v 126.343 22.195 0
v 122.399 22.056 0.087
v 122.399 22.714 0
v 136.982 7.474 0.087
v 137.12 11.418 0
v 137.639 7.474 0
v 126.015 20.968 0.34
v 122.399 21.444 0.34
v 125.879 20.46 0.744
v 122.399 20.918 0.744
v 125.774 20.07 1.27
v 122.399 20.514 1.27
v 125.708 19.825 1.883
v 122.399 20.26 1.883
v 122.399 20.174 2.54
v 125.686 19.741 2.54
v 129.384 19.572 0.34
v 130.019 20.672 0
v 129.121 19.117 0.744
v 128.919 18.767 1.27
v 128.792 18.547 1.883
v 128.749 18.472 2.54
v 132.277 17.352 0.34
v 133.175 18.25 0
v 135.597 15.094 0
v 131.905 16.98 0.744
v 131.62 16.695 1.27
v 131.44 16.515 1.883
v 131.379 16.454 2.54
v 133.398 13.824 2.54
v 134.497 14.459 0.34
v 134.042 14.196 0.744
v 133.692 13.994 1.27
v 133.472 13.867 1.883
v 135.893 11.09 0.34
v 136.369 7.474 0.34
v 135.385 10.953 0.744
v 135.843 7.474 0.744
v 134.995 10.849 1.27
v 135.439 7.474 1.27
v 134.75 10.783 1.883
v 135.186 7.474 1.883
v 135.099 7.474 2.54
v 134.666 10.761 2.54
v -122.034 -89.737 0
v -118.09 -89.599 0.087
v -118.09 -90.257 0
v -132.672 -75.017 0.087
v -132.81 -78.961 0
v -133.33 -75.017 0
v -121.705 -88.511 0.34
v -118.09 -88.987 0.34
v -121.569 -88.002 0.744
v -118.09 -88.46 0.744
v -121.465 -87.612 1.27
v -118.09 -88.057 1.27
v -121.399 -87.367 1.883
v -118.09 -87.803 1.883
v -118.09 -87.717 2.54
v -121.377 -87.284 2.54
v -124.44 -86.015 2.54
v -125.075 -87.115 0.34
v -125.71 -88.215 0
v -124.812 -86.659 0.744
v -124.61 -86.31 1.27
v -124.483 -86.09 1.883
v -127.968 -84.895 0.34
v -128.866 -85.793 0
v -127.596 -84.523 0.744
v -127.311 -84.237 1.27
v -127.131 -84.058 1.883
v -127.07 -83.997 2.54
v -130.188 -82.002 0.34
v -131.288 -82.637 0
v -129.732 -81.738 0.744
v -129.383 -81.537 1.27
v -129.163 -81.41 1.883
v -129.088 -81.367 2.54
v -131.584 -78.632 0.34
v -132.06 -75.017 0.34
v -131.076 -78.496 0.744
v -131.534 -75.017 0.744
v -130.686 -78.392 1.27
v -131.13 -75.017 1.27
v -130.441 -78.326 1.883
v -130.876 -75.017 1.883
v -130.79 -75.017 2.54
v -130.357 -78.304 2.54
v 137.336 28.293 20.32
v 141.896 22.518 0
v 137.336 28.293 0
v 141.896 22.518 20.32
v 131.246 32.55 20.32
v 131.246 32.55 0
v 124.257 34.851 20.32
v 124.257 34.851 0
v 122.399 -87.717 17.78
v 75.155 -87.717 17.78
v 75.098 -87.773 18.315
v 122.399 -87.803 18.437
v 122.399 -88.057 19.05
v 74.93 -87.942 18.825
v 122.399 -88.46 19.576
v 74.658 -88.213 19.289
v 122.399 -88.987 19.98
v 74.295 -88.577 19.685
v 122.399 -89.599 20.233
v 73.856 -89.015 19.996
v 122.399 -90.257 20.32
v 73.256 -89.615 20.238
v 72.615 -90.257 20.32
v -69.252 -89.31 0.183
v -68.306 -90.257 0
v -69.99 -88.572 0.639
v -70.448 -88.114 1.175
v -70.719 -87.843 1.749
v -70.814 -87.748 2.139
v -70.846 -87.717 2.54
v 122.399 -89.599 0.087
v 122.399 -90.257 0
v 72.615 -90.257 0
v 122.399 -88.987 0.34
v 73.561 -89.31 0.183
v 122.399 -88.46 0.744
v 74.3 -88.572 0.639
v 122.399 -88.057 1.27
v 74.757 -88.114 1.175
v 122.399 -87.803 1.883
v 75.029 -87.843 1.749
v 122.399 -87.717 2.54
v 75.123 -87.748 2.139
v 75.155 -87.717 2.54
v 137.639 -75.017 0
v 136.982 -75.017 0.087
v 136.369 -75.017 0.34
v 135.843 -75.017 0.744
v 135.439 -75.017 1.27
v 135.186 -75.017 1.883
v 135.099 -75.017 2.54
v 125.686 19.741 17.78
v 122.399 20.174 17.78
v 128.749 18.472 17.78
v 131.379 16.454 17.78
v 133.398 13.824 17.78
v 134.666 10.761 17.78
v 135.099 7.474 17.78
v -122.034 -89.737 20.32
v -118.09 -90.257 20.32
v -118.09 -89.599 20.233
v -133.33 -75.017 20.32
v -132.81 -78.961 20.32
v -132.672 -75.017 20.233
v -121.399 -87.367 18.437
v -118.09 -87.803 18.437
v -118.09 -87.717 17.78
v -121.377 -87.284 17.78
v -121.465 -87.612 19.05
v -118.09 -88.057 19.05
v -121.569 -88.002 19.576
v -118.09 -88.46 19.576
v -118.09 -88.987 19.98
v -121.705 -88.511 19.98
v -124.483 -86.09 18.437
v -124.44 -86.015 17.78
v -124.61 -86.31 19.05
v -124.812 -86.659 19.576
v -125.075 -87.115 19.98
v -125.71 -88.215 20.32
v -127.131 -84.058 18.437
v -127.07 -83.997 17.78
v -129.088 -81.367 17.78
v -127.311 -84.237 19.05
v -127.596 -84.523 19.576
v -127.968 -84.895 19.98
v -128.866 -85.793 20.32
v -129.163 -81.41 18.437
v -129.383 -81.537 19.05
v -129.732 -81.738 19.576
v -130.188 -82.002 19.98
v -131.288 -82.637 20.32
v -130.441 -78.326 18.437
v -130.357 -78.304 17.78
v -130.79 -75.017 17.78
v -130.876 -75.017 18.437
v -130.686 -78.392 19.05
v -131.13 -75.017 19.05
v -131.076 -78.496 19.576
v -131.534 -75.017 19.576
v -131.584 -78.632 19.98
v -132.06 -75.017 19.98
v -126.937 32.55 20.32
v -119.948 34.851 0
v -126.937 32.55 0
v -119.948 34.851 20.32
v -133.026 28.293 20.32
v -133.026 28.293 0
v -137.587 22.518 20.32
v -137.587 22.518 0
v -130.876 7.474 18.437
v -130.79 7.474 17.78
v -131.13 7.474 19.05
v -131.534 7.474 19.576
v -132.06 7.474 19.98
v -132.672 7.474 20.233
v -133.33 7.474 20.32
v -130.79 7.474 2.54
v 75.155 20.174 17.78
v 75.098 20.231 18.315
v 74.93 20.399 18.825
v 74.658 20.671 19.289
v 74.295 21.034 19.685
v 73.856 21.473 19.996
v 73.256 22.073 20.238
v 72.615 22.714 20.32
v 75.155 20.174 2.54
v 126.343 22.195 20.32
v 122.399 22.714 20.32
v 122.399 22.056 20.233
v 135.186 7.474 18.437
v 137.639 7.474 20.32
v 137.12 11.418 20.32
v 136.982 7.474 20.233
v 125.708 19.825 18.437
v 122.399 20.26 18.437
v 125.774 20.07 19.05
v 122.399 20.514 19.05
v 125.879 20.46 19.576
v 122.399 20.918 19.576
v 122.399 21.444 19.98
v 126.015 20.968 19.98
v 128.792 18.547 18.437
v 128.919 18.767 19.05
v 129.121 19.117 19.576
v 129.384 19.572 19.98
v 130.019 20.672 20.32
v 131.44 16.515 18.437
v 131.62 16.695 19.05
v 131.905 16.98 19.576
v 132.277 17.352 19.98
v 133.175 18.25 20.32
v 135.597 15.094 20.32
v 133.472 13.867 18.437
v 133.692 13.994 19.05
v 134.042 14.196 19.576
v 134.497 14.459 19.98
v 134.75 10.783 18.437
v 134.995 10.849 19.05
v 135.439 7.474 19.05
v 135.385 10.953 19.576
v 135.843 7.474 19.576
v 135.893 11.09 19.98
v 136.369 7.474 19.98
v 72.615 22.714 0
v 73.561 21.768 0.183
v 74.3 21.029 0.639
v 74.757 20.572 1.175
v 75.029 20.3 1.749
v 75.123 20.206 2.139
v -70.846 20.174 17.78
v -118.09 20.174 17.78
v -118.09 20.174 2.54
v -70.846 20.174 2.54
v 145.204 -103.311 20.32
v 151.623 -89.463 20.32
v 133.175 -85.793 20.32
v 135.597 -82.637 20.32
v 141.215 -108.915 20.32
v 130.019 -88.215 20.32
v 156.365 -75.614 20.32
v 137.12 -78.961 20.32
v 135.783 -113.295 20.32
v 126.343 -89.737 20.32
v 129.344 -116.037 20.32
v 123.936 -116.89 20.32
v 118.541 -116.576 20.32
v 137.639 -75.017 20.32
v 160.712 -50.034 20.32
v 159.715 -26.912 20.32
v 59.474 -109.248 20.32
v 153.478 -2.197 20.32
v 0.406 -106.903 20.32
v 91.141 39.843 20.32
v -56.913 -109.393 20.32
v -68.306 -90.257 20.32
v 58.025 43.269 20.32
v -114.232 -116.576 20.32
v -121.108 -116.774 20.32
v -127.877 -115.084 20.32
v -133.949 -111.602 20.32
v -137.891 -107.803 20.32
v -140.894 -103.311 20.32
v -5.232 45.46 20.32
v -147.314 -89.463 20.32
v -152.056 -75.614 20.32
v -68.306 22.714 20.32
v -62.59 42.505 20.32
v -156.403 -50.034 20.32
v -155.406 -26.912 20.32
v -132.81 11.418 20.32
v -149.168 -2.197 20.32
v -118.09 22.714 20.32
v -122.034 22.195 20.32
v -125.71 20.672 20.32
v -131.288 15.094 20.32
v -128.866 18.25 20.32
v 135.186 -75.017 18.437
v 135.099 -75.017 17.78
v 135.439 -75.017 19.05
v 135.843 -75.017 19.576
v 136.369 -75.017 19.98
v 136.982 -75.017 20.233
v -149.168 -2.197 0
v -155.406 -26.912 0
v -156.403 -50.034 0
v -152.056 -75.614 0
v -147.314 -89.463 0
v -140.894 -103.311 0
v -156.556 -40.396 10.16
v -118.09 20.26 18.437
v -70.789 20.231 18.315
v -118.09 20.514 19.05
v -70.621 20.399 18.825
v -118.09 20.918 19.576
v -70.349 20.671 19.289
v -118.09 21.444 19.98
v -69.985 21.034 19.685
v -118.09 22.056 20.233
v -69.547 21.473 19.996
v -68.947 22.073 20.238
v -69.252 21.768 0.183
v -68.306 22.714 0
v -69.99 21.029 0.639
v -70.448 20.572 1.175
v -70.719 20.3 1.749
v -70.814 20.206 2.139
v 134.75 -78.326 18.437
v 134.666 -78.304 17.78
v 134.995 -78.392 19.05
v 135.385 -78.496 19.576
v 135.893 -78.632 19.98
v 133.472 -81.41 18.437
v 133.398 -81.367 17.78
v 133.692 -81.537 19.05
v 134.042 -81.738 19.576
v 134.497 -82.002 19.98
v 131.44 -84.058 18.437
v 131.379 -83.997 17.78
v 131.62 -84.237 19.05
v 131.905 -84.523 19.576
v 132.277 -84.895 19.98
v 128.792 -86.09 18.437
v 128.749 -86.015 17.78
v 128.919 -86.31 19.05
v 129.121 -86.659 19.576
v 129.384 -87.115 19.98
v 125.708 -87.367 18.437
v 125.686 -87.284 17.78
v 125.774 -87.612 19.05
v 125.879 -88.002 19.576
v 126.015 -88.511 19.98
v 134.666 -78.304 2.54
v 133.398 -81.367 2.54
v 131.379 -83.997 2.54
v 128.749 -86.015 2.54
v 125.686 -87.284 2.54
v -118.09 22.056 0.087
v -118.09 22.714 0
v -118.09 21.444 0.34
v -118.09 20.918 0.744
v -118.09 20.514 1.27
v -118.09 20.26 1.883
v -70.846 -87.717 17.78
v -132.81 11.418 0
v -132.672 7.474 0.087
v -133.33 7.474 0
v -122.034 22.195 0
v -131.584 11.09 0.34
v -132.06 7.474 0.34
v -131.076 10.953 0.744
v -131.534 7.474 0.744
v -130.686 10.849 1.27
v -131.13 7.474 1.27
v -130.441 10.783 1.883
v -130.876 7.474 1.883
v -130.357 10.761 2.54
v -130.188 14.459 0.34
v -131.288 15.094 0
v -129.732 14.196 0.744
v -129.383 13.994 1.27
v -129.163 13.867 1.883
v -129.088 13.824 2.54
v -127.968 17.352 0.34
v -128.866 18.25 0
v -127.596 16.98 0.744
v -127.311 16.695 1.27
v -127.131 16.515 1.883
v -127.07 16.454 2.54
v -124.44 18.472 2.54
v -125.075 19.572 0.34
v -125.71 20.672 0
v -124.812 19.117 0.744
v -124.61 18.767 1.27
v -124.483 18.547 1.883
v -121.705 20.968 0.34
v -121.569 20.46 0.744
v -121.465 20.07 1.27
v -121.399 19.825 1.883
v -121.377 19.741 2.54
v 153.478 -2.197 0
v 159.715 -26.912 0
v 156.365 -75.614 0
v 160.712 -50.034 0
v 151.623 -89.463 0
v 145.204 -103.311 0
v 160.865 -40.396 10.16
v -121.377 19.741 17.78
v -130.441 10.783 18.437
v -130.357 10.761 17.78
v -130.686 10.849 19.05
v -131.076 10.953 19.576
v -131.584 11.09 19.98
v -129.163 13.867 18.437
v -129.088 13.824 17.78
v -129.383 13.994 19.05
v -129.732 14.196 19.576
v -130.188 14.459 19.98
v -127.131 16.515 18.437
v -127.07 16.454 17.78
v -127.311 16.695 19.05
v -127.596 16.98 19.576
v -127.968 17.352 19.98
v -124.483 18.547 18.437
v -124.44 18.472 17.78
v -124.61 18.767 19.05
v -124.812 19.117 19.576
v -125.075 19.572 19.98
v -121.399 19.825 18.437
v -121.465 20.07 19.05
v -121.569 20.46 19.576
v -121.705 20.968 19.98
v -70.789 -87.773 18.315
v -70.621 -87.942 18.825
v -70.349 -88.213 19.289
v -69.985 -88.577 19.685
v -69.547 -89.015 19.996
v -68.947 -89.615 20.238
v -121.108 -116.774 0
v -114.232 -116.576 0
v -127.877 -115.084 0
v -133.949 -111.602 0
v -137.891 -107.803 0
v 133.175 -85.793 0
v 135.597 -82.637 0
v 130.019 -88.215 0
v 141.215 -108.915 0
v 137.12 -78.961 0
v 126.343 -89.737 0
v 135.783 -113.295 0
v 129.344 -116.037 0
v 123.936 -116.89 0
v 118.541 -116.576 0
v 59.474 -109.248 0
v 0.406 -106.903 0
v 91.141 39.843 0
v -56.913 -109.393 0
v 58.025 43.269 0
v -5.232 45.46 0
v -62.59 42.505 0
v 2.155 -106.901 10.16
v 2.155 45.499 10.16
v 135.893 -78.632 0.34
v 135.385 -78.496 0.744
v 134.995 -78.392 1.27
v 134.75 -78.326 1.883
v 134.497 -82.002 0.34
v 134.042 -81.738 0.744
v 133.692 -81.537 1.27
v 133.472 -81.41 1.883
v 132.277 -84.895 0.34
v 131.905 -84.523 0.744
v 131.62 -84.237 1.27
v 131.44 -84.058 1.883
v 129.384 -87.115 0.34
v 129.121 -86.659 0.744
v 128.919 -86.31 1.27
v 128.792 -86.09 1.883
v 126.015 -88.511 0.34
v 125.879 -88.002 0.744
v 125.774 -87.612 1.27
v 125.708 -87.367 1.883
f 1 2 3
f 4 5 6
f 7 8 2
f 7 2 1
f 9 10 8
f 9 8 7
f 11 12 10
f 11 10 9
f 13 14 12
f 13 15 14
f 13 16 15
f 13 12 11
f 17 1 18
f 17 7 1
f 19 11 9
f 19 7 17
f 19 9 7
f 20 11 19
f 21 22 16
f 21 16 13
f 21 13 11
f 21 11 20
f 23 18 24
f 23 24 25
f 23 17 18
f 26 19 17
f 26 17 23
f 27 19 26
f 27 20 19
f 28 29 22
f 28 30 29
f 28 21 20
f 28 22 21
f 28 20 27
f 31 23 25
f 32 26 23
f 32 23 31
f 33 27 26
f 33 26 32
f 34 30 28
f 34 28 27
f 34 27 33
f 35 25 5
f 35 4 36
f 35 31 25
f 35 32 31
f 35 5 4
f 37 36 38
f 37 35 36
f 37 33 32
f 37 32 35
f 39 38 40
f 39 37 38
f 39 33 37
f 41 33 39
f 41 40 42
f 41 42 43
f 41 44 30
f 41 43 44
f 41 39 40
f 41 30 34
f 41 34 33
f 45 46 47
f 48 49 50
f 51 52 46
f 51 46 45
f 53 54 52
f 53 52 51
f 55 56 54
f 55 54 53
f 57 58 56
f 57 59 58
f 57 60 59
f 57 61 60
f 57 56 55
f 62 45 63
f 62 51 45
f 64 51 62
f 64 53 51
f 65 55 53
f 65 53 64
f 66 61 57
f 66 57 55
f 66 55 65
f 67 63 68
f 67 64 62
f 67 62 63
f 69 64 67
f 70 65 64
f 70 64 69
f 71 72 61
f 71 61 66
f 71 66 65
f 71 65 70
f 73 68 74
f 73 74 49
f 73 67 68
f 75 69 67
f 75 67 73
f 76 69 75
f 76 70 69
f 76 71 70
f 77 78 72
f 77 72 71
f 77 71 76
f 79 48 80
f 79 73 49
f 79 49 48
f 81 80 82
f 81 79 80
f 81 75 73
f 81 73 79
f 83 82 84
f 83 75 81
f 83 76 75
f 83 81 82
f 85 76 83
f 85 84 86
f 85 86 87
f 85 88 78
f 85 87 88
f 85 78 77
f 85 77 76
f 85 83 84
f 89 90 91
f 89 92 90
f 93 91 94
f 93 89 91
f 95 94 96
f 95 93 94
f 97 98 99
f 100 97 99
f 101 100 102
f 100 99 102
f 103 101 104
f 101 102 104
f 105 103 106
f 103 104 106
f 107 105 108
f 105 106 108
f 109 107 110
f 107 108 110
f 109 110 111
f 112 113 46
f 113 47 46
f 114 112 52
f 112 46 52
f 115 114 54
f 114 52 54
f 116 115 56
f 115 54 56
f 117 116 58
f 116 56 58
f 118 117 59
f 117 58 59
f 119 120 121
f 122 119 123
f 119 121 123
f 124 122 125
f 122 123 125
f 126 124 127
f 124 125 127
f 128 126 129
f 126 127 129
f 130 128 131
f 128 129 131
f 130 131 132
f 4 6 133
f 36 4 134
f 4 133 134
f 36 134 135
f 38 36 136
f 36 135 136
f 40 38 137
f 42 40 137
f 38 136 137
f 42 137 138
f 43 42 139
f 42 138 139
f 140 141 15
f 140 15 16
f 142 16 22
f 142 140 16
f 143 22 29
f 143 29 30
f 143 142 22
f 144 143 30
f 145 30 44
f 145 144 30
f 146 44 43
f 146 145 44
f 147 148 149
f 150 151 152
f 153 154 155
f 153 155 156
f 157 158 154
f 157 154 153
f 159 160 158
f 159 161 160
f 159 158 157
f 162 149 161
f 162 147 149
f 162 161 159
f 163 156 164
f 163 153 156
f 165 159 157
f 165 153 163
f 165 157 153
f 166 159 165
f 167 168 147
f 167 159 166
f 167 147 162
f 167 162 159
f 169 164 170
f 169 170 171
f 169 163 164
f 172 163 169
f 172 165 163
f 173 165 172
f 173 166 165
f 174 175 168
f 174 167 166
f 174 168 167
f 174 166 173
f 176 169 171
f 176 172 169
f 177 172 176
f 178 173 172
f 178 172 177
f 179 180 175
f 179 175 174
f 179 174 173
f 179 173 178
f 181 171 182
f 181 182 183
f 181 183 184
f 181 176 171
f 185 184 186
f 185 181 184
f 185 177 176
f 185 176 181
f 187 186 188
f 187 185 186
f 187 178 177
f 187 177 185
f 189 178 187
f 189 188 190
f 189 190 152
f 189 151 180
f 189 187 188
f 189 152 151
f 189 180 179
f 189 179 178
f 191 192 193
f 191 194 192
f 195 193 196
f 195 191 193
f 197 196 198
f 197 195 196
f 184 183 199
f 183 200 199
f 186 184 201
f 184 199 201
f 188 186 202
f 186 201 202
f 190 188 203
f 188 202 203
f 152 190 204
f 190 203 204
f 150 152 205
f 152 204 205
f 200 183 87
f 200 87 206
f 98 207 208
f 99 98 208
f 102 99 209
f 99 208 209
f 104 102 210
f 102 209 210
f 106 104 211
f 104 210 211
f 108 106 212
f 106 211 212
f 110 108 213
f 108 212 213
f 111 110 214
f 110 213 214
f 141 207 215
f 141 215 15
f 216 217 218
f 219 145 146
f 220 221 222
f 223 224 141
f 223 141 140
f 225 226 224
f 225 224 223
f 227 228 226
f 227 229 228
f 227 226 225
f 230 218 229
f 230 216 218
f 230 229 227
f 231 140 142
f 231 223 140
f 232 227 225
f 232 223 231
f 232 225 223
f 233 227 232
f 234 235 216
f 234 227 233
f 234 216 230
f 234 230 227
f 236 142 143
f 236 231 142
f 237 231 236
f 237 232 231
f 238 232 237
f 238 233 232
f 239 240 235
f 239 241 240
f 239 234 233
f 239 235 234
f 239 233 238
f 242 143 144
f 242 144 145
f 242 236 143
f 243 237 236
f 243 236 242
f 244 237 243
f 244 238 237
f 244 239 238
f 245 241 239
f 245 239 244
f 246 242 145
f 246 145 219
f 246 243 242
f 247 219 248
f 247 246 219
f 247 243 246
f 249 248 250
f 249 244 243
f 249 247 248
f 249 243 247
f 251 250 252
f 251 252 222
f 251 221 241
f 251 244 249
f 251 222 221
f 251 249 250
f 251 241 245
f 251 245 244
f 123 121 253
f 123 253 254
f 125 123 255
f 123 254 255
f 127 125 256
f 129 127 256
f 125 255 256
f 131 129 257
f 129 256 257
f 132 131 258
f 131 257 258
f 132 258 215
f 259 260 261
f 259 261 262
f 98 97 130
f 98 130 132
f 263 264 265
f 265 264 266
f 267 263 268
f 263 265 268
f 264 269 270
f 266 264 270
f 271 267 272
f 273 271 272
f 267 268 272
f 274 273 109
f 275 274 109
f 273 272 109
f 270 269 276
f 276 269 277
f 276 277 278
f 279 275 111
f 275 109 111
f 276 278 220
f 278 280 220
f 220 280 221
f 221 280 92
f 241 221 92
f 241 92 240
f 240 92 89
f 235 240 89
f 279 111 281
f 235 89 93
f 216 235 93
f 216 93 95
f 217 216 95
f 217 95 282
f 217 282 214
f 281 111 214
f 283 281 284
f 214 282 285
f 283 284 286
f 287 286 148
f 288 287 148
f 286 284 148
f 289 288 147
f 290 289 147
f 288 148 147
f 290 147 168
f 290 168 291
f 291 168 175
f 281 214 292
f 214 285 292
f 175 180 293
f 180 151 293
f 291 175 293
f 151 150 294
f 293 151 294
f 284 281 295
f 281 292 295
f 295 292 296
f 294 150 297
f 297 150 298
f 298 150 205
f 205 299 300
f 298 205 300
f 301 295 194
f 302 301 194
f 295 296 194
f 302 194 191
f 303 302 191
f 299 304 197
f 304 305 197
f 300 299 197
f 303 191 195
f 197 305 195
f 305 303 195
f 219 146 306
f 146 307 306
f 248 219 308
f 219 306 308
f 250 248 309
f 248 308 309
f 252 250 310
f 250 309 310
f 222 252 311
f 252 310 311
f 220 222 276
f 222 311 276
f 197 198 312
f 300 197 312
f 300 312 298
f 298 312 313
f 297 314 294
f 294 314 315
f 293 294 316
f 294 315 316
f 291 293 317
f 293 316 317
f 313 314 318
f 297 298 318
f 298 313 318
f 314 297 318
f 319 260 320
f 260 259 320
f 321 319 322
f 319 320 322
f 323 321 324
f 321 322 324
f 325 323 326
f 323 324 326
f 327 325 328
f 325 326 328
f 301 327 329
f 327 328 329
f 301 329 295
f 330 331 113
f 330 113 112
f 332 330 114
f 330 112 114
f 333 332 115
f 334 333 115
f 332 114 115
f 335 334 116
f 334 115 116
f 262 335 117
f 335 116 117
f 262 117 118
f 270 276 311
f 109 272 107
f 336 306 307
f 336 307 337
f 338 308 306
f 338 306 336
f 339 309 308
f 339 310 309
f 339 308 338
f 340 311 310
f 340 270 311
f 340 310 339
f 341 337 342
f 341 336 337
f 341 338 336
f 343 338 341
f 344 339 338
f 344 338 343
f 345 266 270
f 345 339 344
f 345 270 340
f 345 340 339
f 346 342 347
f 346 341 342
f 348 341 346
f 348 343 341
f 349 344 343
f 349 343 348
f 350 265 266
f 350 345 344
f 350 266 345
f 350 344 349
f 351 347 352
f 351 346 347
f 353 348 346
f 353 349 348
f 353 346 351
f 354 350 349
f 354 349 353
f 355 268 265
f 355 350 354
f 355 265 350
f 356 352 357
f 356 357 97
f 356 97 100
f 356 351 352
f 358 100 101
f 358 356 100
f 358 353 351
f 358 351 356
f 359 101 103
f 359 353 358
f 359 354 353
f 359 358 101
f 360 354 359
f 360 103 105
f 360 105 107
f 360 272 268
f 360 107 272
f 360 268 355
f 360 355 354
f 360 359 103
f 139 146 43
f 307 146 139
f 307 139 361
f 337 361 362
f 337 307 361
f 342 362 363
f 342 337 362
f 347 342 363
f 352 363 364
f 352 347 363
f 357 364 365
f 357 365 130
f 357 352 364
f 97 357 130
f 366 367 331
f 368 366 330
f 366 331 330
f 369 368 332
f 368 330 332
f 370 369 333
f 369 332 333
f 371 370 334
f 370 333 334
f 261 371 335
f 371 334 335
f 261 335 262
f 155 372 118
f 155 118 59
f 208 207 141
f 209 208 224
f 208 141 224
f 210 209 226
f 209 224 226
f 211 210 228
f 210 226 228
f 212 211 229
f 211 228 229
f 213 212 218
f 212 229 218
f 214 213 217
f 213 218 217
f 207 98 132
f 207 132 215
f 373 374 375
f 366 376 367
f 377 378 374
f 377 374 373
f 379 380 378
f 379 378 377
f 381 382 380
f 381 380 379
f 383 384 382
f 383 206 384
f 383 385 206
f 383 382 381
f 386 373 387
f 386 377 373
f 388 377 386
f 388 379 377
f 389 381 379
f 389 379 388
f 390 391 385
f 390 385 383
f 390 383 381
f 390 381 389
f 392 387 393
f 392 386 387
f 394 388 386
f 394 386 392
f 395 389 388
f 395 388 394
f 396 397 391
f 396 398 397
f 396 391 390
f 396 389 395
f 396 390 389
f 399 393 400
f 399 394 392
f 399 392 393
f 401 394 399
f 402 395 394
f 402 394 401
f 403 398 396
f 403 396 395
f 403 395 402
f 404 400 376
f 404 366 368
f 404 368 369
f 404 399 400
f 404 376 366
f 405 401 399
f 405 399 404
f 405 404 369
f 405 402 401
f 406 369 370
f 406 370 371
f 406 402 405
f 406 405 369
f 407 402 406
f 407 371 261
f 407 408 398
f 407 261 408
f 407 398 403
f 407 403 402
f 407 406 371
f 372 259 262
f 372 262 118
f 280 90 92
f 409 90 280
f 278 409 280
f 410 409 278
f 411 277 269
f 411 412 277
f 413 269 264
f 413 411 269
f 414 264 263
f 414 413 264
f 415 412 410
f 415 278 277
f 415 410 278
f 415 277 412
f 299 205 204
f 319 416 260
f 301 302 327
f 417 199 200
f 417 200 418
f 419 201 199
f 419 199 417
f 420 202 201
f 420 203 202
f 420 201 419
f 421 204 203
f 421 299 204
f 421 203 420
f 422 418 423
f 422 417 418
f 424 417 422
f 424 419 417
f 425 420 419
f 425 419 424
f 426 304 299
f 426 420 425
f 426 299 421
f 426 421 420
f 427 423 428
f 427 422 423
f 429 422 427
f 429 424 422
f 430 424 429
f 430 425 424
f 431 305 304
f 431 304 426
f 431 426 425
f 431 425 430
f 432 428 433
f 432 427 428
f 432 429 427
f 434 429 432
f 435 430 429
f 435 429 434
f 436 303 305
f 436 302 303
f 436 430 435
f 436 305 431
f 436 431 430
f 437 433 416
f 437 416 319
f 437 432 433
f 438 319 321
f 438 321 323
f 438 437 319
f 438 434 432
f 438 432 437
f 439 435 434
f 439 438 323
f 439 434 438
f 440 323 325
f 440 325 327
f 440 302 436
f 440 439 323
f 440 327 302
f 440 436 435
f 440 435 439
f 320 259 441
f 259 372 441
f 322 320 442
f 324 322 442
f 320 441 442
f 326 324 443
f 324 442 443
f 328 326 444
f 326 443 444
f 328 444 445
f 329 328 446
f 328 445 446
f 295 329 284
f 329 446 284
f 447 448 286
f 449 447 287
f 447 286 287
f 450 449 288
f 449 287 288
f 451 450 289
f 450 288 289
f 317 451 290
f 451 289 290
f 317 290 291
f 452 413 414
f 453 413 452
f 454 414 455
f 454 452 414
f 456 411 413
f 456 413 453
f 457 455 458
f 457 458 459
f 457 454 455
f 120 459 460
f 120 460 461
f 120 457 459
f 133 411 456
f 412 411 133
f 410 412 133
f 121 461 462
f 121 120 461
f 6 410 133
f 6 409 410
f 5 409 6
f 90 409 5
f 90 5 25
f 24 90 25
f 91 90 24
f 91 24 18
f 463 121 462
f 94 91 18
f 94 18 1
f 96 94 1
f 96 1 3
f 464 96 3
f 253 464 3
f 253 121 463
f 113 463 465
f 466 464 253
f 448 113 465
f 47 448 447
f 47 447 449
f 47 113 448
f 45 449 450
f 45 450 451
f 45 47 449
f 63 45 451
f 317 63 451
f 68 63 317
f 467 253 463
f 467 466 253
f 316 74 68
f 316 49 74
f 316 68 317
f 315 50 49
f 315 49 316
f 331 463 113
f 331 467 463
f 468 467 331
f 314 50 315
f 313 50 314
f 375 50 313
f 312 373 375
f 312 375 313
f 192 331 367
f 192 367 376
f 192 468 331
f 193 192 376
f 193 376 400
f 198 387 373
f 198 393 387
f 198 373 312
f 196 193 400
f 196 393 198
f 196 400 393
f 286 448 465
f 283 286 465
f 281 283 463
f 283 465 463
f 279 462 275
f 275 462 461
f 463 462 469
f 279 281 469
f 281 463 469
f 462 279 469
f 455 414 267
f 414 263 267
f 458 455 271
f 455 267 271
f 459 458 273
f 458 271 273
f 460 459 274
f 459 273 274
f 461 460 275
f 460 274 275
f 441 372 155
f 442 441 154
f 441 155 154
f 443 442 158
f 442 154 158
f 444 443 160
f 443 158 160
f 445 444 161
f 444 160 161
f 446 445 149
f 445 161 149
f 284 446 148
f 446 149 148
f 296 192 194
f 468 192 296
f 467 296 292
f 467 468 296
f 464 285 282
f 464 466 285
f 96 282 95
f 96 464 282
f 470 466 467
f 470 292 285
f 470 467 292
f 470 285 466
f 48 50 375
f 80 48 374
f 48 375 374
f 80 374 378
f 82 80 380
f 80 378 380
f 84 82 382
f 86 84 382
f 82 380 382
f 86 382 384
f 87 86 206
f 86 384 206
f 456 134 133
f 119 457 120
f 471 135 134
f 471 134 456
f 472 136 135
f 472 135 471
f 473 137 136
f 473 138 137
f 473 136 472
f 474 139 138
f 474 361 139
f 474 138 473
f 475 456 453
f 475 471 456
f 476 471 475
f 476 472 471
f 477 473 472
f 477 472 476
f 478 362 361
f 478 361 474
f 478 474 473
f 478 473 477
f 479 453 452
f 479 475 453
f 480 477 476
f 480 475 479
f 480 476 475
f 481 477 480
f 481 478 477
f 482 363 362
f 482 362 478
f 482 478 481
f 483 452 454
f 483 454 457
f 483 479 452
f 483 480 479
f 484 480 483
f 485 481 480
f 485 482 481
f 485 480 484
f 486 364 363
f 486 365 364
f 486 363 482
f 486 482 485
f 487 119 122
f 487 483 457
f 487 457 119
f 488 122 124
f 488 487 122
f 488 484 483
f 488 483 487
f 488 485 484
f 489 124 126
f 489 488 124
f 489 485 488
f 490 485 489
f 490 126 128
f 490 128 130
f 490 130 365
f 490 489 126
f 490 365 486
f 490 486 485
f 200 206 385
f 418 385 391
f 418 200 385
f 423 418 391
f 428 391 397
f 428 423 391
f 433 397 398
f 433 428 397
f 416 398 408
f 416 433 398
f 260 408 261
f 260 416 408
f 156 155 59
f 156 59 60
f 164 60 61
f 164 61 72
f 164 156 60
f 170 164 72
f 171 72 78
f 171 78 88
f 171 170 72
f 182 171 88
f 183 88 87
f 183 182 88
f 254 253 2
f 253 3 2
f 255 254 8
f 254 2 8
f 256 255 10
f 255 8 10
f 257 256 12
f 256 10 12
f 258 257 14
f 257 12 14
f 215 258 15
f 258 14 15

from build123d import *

# Parameters (mm, degrees)
BOSS_EXTRUDE2_DEPTH = 20.32
FILLET1_R           = 25.4
FILLET2_R           = 25.4
FILLET3_R           = 25.4
FILLET4_R           = 25.4
CUT_EXTRUDE1_DEPTH  = 20.32
FILLET5_R           = 2.54


with BuildPart() as part:
    # Sketch1 → Boss-Extrude2 (new body)
    with BuildSketch(Plane.XY):
        with BuildLine():
            add(Edge.make_bspline(
                [(-131.195332136, 32.798833034), (2.154667864, 58.198833034), (135.504667864, 32.798833034)],
                knots=[0, 0, 0, 1, 1, 1], degree=2))
            add(Edge.make_bspline(
                [(135.504667864, 32.798833034), (186.304667864, -43.401166966), (135.504667864, -119.601166966)],
                knots=[0, 0, 0, 1, 1, 1], degree=2))
            add(Edge.make_bspline(
                [(-131.195332136, -119.601166966), (2.154667864, -94.201166966), (135.504667864, -119.601166966)],
                knots=[0, 0, 0, 1, 1, 1], degree=2))
            add(Edge.make_bspline(
                [(-131.195332136, 32.798833034), (-181.995332136, -43.401166966), (-131.195332136, -119.601166966)],
                knots=[0, 0, 0, 1, 1, 1], degree=2))
        make_face()
    extrude(amount=BOSS_EXTRUDE2_DEPTH)

    # Fillet1
    fillet1_edges = [part.edges().sort_by_distance(p)[0] for p in [
        (135.504667864, -119.601166966, 10.16),
    ]]
    fillet(fillet1_edges, radius=FILLET1_R)

    # Fillet2
    fillet2_edges = [part.edges().sort_by_distance(p)[0] for p in [
        (-131.195332136, -119.601166966, 10.16),
    ]]
    fillet(fillet2_edges, radius=FILLET2_R)

    # Fillet3
    fillet3_edges = [part.edges().sort_by_distance(p)[0] for p in [
        (135.504667864, 32.798833034, 10.16),
    ]]
    fillet(fillet3_edges, radius=FILLET3_R)

    # Fillet4
    fillet4_edges = [part.edges().sort_by_distance(p)[0] for p in [
        (-131.195332136, 32.798833034, 10.16),
    ]]
    fillet(fillet4_edges, radius=FILLET4_R)

    # Sketch2 → Cut-Extrude1 (cut)
    with BuildSketch(Plane.XY.offset(20.32)):
        with BuildLine():
            Line((-118.089671205, 20.173896233), (-70.845671205, 20.173896233))
            Line((-70.845671205, 20.173896233), (-70.845671205, -87.716522063))
            Line((-70.845671205, -87.716522063), (-118.089671205, -87.716522063))
            ThreePointArc((-118.089671205, -87.716522063), (-127.069927326, -83.996778184), (-130.789671205, -75.016522063))
            Line((-130.789671205, -75.016522063), (-130.789671205, 7.473896233))
            ThreePointArc((-130.789671205, 7.473896233), (-127.069927326, 16.454152354), (-118.089671205, 20.173896233))
        make_face()
        with BuildLine():
            Line((135.099006932, 7.473896233), (135.099006932, -75.016522063))
            ThreePointArc((135.099006932, -75.016522063), (131.379263053, -83.996778184), (122.399006932, -87.716522063))
            Line((122.399006932, -87.716522063), (75.155006932, -87.716522063))
            Line((75.155006932, -87.716522063), (75.155006932, 20.173896233))
            Line((75.155006932, 20.173896233), (122.399006932, 20.173896233))
            ThreePointArc((122.399006932, 20.173896233), (131.379263053, 16.454152354), (135.099006932, 7.473896233))
        make_face()
    extrude(amount=-CUT_EXTRUDE1_DEPTH, mode=Mode.SUBTRACT)

    # Fillet5
    fillet5_edges = [part.edges().sort_by_distance(p)[0] for p in [
        (-127.069927326, 16.454152354, 0),
        (-94.467671205, 20.173896233, 20.32),
        (-70.845671205, -33.771312915, 20.32),
        (-94.467671205, -87.716522063, 0),
        (-127.069927326, -83.996778184, 0),
        (-130.789671205, -33.771312915, 0),
        (-94.467671205, 20.173896233, 0),
        (-70.845671205, -33.771312915, 0),
        (-127.069927326, 16.454152354, 20.32),
        (-130.789671205, -33.771312915, 20.32),
        (-127.069927326, -83.996778184, 20.32),
        (-94.467671205, -87.716522063, 20.32),
        (98.777006932, 20.173896233, 20.32),
        (131.379263053, 16.454152354, 20.32),
        (135.099006932, -33.771312915, 20.32),
        (131.379263053, -83.996778184, 0),
        (98.777006932, -87.716522063, 0),
        (75.155006932, -33.771312915, 0),
        (98.777006932, 20.173896233, 0),
        (131.379263053, 16.454152354, 0),
        (135.099006932, -33.771312915, 0),
        (75.155006932, -33.771312915, 20.32),
        (98.777006932, -87.716522063, 20.32),
        (131.379263053, -83.996778184, 20.32),
    ]]
    fillet(fillet5_edges, radius=FILLET5_R)


solid = part.part
